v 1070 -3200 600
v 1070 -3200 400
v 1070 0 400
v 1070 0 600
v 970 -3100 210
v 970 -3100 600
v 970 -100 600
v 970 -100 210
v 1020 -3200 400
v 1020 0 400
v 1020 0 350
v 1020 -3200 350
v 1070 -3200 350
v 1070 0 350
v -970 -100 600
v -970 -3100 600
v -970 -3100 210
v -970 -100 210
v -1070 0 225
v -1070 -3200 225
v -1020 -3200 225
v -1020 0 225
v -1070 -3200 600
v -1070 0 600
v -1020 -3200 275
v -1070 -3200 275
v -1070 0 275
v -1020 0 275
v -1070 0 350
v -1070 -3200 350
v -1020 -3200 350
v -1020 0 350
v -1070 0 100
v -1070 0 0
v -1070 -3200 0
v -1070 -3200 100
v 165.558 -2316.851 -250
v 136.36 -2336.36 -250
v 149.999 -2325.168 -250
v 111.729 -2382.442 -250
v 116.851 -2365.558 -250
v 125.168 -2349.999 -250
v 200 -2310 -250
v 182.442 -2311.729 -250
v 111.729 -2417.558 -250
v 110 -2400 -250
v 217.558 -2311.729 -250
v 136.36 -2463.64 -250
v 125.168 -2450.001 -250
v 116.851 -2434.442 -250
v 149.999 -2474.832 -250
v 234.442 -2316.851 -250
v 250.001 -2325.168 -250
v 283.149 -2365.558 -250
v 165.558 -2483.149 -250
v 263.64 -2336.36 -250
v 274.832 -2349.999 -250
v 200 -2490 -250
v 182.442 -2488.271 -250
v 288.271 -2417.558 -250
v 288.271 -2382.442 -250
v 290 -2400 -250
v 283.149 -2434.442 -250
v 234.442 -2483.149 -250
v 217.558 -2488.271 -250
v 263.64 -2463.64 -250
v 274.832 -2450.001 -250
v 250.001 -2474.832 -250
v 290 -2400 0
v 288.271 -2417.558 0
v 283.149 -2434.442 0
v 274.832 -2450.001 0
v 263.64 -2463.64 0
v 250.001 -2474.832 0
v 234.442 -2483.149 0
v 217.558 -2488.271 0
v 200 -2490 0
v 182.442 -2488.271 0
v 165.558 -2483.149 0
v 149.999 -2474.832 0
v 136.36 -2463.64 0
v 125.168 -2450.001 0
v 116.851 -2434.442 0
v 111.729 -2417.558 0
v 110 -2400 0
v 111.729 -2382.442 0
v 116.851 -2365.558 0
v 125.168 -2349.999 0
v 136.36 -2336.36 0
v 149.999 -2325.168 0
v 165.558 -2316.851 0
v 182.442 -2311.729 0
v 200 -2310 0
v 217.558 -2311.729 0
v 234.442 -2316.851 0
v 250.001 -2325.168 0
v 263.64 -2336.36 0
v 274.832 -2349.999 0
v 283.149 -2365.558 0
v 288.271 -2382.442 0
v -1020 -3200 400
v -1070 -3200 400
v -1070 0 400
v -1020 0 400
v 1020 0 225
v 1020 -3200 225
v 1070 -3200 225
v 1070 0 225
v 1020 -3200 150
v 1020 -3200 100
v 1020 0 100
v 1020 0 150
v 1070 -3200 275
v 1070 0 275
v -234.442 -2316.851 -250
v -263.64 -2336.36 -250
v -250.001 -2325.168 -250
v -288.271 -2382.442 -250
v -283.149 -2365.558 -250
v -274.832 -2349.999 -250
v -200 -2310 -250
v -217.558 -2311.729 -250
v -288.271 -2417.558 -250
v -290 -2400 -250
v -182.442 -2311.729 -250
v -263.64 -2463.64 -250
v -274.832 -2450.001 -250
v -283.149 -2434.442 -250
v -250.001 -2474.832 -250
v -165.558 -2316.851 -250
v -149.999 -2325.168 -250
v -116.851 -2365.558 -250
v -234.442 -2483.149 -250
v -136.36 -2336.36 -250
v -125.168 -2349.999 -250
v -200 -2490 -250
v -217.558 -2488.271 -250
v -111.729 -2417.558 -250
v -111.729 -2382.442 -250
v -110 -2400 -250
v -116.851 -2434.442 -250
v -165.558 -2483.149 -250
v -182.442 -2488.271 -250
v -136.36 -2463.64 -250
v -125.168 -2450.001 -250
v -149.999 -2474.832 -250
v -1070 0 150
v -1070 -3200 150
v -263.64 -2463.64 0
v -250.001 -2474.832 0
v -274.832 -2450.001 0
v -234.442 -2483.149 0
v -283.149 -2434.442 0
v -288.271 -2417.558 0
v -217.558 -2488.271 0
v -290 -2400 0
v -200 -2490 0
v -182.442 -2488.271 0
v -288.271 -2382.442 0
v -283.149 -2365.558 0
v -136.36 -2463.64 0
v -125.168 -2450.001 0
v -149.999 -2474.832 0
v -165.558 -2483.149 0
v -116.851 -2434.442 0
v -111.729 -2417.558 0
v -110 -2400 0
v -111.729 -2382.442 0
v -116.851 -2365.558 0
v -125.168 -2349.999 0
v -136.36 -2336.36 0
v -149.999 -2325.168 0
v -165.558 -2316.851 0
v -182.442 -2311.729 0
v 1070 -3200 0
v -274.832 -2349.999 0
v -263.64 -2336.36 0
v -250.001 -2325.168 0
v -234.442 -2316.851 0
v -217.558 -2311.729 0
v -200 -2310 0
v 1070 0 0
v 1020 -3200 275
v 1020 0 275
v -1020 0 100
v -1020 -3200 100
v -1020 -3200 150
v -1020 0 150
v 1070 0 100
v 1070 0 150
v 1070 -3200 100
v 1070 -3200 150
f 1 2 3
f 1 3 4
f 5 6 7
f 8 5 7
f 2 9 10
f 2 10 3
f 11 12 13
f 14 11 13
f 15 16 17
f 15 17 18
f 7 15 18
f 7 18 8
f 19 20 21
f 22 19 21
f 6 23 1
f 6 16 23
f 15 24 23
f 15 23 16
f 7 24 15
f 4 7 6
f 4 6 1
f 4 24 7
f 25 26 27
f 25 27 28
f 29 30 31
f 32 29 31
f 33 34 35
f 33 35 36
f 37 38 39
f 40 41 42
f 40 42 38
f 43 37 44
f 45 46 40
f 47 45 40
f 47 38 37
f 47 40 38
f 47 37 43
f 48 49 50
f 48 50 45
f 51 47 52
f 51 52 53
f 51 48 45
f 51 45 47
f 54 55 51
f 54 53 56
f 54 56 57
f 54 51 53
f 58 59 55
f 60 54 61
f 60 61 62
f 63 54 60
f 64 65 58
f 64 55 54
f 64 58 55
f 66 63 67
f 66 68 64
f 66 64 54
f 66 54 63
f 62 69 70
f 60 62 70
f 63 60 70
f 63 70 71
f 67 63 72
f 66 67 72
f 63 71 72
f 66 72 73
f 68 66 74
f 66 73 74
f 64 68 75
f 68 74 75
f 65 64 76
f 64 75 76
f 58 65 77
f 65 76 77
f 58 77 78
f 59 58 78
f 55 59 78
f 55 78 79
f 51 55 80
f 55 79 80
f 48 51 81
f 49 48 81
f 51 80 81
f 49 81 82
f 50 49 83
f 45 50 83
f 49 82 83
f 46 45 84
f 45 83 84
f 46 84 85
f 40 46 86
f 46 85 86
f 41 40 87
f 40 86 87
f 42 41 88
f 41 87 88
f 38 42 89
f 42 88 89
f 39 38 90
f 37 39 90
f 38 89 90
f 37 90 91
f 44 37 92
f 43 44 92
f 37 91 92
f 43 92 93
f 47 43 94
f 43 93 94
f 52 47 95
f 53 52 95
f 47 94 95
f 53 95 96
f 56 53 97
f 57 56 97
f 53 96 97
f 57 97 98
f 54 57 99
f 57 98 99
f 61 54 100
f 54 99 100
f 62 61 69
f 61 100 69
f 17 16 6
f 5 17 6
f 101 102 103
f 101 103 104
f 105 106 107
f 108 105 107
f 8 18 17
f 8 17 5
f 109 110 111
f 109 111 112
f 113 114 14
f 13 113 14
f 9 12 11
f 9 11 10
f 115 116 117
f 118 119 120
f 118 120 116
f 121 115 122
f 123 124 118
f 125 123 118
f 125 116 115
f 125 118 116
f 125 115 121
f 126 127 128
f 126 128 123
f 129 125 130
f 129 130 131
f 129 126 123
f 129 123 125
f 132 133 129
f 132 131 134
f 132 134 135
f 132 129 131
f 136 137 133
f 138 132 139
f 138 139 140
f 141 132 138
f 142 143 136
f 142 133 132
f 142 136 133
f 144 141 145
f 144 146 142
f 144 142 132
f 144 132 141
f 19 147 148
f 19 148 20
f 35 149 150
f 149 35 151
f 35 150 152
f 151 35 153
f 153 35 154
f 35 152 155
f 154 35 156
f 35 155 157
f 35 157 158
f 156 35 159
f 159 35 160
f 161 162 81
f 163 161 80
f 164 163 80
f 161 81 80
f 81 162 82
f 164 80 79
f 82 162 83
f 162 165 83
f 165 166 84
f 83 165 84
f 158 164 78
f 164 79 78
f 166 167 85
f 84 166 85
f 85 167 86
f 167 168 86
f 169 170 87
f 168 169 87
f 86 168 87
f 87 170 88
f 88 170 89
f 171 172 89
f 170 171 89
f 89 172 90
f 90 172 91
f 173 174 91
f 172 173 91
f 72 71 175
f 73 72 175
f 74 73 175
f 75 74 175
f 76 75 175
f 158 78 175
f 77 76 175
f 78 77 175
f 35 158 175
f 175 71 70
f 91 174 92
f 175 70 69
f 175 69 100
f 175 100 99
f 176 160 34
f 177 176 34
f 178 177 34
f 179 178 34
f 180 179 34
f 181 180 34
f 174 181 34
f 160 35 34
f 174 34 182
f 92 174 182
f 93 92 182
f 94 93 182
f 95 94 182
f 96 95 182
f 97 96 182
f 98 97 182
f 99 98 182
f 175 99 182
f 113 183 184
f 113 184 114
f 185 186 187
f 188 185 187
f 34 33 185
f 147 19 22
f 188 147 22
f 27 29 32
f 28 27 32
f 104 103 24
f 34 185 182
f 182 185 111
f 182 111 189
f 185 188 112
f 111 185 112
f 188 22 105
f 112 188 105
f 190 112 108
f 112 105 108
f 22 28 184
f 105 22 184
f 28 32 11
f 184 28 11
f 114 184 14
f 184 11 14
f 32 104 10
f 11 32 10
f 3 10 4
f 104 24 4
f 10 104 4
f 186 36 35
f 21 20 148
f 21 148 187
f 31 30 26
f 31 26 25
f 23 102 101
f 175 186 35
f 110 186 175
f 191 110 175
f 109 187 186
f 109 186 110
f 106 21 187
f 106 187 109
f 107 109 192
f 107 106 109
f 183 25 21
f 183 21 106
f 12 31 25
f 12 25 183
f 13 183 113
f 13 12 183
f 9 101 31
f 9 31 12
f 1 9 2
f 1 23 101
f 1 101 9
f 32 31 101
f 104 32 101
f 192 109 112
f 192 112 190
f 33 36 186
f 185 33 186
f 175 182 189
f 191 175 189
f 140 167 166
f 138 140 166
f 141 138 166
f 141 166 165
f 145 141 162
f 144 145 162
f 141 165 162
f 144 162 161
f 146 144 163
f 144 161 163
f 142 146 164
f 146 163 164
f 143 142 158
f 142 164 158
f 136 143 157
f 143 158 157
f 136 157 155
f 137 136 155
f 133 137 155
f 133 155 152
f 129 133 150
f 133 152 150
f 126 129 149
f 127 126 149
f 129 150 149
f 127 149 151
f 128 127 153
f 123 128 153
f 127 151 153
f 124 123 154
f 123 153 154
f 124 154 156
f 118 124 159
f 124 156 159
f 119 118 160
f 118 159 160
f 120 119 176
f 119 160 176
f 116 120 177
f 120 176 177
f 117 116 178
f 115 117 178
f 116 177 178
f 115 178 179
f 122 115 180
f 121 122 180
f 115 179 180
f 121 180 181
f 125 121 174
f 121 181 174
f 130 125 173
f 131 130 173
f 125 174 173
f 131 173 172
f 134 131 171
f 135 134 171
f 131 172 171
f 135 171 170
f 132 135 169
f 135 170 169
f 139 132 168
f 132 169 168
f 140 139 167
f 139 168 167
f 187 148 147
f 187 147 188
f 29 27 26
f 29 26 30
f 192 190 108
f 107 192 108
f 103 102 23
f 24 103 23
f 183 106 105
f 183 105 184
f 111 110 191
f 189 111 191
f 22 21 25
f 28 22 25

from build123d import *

# Parameters (mm, degrees)
F0_W     = 2140
F0_H     = 600
F1_DEPTH = 3200
F2_W     = 1940
F2_H     = 3000
F3_DEPTH = 390
F4_R     = 90
F5_DEPTH = 250
F6_W     = 50
F6_H     = 50
F7_DEPTH = 3200


with BuildPart() as f1:
    # F0 (on Front) → F1 (new body)
    with BuildSketch(Plane.XZ):
        with Locations((0, 300)):
            Rectangle(F0_W, F0_H)
    extrude(amount=F1_DEPTH)

    # F2 (on face) → F3 (cut)
    with BuildSketch(Plane.XY.offset(600)):
        with Locations((0, -1600)):
            Rectangle(F2_W, F2_H)
    extrude(amount=-F3_DEPTH, mode=Mode.SUBTRACT)

    # F4 (on face) → F5 (join)
    with BuildSketch(Plane(origin=(0, 0, 0), x_dir=(1, 0, 0), z_dir=(0, 0, -1))):
        with Locations((-200, 2400)):
            Circle(F4_R)
        with Locations((200, 2400)):
            Circle(F4_R)
    extrude(amount=F5_DEPTH)

    # F6 (on face) → F7 (cut)
    with BuildSketch(Plane.XZ.offset(3200)):
        with Locations((1045, 375)):
            Rectangle(F6_W, F6_H)
        with Locations((1045, 250)):
            Rectangle(F6_W, F6_H)
        with Locations((1045, 125)):
            Rectangle(F6_W, F6_H)
        with Locations((-1045, 125)):
            Rectangle(F6_W, F6_H)
        with Locations((-1045, 250)):
            Rectangle(F6_W, F6_H)
        with Locations((-1045, 375)):
            Rectangle(F6_W, F6_H)
    extrude(amount=-F7_DEPTH, mode=Mode.SUBTRACT)


solid = f1.part
